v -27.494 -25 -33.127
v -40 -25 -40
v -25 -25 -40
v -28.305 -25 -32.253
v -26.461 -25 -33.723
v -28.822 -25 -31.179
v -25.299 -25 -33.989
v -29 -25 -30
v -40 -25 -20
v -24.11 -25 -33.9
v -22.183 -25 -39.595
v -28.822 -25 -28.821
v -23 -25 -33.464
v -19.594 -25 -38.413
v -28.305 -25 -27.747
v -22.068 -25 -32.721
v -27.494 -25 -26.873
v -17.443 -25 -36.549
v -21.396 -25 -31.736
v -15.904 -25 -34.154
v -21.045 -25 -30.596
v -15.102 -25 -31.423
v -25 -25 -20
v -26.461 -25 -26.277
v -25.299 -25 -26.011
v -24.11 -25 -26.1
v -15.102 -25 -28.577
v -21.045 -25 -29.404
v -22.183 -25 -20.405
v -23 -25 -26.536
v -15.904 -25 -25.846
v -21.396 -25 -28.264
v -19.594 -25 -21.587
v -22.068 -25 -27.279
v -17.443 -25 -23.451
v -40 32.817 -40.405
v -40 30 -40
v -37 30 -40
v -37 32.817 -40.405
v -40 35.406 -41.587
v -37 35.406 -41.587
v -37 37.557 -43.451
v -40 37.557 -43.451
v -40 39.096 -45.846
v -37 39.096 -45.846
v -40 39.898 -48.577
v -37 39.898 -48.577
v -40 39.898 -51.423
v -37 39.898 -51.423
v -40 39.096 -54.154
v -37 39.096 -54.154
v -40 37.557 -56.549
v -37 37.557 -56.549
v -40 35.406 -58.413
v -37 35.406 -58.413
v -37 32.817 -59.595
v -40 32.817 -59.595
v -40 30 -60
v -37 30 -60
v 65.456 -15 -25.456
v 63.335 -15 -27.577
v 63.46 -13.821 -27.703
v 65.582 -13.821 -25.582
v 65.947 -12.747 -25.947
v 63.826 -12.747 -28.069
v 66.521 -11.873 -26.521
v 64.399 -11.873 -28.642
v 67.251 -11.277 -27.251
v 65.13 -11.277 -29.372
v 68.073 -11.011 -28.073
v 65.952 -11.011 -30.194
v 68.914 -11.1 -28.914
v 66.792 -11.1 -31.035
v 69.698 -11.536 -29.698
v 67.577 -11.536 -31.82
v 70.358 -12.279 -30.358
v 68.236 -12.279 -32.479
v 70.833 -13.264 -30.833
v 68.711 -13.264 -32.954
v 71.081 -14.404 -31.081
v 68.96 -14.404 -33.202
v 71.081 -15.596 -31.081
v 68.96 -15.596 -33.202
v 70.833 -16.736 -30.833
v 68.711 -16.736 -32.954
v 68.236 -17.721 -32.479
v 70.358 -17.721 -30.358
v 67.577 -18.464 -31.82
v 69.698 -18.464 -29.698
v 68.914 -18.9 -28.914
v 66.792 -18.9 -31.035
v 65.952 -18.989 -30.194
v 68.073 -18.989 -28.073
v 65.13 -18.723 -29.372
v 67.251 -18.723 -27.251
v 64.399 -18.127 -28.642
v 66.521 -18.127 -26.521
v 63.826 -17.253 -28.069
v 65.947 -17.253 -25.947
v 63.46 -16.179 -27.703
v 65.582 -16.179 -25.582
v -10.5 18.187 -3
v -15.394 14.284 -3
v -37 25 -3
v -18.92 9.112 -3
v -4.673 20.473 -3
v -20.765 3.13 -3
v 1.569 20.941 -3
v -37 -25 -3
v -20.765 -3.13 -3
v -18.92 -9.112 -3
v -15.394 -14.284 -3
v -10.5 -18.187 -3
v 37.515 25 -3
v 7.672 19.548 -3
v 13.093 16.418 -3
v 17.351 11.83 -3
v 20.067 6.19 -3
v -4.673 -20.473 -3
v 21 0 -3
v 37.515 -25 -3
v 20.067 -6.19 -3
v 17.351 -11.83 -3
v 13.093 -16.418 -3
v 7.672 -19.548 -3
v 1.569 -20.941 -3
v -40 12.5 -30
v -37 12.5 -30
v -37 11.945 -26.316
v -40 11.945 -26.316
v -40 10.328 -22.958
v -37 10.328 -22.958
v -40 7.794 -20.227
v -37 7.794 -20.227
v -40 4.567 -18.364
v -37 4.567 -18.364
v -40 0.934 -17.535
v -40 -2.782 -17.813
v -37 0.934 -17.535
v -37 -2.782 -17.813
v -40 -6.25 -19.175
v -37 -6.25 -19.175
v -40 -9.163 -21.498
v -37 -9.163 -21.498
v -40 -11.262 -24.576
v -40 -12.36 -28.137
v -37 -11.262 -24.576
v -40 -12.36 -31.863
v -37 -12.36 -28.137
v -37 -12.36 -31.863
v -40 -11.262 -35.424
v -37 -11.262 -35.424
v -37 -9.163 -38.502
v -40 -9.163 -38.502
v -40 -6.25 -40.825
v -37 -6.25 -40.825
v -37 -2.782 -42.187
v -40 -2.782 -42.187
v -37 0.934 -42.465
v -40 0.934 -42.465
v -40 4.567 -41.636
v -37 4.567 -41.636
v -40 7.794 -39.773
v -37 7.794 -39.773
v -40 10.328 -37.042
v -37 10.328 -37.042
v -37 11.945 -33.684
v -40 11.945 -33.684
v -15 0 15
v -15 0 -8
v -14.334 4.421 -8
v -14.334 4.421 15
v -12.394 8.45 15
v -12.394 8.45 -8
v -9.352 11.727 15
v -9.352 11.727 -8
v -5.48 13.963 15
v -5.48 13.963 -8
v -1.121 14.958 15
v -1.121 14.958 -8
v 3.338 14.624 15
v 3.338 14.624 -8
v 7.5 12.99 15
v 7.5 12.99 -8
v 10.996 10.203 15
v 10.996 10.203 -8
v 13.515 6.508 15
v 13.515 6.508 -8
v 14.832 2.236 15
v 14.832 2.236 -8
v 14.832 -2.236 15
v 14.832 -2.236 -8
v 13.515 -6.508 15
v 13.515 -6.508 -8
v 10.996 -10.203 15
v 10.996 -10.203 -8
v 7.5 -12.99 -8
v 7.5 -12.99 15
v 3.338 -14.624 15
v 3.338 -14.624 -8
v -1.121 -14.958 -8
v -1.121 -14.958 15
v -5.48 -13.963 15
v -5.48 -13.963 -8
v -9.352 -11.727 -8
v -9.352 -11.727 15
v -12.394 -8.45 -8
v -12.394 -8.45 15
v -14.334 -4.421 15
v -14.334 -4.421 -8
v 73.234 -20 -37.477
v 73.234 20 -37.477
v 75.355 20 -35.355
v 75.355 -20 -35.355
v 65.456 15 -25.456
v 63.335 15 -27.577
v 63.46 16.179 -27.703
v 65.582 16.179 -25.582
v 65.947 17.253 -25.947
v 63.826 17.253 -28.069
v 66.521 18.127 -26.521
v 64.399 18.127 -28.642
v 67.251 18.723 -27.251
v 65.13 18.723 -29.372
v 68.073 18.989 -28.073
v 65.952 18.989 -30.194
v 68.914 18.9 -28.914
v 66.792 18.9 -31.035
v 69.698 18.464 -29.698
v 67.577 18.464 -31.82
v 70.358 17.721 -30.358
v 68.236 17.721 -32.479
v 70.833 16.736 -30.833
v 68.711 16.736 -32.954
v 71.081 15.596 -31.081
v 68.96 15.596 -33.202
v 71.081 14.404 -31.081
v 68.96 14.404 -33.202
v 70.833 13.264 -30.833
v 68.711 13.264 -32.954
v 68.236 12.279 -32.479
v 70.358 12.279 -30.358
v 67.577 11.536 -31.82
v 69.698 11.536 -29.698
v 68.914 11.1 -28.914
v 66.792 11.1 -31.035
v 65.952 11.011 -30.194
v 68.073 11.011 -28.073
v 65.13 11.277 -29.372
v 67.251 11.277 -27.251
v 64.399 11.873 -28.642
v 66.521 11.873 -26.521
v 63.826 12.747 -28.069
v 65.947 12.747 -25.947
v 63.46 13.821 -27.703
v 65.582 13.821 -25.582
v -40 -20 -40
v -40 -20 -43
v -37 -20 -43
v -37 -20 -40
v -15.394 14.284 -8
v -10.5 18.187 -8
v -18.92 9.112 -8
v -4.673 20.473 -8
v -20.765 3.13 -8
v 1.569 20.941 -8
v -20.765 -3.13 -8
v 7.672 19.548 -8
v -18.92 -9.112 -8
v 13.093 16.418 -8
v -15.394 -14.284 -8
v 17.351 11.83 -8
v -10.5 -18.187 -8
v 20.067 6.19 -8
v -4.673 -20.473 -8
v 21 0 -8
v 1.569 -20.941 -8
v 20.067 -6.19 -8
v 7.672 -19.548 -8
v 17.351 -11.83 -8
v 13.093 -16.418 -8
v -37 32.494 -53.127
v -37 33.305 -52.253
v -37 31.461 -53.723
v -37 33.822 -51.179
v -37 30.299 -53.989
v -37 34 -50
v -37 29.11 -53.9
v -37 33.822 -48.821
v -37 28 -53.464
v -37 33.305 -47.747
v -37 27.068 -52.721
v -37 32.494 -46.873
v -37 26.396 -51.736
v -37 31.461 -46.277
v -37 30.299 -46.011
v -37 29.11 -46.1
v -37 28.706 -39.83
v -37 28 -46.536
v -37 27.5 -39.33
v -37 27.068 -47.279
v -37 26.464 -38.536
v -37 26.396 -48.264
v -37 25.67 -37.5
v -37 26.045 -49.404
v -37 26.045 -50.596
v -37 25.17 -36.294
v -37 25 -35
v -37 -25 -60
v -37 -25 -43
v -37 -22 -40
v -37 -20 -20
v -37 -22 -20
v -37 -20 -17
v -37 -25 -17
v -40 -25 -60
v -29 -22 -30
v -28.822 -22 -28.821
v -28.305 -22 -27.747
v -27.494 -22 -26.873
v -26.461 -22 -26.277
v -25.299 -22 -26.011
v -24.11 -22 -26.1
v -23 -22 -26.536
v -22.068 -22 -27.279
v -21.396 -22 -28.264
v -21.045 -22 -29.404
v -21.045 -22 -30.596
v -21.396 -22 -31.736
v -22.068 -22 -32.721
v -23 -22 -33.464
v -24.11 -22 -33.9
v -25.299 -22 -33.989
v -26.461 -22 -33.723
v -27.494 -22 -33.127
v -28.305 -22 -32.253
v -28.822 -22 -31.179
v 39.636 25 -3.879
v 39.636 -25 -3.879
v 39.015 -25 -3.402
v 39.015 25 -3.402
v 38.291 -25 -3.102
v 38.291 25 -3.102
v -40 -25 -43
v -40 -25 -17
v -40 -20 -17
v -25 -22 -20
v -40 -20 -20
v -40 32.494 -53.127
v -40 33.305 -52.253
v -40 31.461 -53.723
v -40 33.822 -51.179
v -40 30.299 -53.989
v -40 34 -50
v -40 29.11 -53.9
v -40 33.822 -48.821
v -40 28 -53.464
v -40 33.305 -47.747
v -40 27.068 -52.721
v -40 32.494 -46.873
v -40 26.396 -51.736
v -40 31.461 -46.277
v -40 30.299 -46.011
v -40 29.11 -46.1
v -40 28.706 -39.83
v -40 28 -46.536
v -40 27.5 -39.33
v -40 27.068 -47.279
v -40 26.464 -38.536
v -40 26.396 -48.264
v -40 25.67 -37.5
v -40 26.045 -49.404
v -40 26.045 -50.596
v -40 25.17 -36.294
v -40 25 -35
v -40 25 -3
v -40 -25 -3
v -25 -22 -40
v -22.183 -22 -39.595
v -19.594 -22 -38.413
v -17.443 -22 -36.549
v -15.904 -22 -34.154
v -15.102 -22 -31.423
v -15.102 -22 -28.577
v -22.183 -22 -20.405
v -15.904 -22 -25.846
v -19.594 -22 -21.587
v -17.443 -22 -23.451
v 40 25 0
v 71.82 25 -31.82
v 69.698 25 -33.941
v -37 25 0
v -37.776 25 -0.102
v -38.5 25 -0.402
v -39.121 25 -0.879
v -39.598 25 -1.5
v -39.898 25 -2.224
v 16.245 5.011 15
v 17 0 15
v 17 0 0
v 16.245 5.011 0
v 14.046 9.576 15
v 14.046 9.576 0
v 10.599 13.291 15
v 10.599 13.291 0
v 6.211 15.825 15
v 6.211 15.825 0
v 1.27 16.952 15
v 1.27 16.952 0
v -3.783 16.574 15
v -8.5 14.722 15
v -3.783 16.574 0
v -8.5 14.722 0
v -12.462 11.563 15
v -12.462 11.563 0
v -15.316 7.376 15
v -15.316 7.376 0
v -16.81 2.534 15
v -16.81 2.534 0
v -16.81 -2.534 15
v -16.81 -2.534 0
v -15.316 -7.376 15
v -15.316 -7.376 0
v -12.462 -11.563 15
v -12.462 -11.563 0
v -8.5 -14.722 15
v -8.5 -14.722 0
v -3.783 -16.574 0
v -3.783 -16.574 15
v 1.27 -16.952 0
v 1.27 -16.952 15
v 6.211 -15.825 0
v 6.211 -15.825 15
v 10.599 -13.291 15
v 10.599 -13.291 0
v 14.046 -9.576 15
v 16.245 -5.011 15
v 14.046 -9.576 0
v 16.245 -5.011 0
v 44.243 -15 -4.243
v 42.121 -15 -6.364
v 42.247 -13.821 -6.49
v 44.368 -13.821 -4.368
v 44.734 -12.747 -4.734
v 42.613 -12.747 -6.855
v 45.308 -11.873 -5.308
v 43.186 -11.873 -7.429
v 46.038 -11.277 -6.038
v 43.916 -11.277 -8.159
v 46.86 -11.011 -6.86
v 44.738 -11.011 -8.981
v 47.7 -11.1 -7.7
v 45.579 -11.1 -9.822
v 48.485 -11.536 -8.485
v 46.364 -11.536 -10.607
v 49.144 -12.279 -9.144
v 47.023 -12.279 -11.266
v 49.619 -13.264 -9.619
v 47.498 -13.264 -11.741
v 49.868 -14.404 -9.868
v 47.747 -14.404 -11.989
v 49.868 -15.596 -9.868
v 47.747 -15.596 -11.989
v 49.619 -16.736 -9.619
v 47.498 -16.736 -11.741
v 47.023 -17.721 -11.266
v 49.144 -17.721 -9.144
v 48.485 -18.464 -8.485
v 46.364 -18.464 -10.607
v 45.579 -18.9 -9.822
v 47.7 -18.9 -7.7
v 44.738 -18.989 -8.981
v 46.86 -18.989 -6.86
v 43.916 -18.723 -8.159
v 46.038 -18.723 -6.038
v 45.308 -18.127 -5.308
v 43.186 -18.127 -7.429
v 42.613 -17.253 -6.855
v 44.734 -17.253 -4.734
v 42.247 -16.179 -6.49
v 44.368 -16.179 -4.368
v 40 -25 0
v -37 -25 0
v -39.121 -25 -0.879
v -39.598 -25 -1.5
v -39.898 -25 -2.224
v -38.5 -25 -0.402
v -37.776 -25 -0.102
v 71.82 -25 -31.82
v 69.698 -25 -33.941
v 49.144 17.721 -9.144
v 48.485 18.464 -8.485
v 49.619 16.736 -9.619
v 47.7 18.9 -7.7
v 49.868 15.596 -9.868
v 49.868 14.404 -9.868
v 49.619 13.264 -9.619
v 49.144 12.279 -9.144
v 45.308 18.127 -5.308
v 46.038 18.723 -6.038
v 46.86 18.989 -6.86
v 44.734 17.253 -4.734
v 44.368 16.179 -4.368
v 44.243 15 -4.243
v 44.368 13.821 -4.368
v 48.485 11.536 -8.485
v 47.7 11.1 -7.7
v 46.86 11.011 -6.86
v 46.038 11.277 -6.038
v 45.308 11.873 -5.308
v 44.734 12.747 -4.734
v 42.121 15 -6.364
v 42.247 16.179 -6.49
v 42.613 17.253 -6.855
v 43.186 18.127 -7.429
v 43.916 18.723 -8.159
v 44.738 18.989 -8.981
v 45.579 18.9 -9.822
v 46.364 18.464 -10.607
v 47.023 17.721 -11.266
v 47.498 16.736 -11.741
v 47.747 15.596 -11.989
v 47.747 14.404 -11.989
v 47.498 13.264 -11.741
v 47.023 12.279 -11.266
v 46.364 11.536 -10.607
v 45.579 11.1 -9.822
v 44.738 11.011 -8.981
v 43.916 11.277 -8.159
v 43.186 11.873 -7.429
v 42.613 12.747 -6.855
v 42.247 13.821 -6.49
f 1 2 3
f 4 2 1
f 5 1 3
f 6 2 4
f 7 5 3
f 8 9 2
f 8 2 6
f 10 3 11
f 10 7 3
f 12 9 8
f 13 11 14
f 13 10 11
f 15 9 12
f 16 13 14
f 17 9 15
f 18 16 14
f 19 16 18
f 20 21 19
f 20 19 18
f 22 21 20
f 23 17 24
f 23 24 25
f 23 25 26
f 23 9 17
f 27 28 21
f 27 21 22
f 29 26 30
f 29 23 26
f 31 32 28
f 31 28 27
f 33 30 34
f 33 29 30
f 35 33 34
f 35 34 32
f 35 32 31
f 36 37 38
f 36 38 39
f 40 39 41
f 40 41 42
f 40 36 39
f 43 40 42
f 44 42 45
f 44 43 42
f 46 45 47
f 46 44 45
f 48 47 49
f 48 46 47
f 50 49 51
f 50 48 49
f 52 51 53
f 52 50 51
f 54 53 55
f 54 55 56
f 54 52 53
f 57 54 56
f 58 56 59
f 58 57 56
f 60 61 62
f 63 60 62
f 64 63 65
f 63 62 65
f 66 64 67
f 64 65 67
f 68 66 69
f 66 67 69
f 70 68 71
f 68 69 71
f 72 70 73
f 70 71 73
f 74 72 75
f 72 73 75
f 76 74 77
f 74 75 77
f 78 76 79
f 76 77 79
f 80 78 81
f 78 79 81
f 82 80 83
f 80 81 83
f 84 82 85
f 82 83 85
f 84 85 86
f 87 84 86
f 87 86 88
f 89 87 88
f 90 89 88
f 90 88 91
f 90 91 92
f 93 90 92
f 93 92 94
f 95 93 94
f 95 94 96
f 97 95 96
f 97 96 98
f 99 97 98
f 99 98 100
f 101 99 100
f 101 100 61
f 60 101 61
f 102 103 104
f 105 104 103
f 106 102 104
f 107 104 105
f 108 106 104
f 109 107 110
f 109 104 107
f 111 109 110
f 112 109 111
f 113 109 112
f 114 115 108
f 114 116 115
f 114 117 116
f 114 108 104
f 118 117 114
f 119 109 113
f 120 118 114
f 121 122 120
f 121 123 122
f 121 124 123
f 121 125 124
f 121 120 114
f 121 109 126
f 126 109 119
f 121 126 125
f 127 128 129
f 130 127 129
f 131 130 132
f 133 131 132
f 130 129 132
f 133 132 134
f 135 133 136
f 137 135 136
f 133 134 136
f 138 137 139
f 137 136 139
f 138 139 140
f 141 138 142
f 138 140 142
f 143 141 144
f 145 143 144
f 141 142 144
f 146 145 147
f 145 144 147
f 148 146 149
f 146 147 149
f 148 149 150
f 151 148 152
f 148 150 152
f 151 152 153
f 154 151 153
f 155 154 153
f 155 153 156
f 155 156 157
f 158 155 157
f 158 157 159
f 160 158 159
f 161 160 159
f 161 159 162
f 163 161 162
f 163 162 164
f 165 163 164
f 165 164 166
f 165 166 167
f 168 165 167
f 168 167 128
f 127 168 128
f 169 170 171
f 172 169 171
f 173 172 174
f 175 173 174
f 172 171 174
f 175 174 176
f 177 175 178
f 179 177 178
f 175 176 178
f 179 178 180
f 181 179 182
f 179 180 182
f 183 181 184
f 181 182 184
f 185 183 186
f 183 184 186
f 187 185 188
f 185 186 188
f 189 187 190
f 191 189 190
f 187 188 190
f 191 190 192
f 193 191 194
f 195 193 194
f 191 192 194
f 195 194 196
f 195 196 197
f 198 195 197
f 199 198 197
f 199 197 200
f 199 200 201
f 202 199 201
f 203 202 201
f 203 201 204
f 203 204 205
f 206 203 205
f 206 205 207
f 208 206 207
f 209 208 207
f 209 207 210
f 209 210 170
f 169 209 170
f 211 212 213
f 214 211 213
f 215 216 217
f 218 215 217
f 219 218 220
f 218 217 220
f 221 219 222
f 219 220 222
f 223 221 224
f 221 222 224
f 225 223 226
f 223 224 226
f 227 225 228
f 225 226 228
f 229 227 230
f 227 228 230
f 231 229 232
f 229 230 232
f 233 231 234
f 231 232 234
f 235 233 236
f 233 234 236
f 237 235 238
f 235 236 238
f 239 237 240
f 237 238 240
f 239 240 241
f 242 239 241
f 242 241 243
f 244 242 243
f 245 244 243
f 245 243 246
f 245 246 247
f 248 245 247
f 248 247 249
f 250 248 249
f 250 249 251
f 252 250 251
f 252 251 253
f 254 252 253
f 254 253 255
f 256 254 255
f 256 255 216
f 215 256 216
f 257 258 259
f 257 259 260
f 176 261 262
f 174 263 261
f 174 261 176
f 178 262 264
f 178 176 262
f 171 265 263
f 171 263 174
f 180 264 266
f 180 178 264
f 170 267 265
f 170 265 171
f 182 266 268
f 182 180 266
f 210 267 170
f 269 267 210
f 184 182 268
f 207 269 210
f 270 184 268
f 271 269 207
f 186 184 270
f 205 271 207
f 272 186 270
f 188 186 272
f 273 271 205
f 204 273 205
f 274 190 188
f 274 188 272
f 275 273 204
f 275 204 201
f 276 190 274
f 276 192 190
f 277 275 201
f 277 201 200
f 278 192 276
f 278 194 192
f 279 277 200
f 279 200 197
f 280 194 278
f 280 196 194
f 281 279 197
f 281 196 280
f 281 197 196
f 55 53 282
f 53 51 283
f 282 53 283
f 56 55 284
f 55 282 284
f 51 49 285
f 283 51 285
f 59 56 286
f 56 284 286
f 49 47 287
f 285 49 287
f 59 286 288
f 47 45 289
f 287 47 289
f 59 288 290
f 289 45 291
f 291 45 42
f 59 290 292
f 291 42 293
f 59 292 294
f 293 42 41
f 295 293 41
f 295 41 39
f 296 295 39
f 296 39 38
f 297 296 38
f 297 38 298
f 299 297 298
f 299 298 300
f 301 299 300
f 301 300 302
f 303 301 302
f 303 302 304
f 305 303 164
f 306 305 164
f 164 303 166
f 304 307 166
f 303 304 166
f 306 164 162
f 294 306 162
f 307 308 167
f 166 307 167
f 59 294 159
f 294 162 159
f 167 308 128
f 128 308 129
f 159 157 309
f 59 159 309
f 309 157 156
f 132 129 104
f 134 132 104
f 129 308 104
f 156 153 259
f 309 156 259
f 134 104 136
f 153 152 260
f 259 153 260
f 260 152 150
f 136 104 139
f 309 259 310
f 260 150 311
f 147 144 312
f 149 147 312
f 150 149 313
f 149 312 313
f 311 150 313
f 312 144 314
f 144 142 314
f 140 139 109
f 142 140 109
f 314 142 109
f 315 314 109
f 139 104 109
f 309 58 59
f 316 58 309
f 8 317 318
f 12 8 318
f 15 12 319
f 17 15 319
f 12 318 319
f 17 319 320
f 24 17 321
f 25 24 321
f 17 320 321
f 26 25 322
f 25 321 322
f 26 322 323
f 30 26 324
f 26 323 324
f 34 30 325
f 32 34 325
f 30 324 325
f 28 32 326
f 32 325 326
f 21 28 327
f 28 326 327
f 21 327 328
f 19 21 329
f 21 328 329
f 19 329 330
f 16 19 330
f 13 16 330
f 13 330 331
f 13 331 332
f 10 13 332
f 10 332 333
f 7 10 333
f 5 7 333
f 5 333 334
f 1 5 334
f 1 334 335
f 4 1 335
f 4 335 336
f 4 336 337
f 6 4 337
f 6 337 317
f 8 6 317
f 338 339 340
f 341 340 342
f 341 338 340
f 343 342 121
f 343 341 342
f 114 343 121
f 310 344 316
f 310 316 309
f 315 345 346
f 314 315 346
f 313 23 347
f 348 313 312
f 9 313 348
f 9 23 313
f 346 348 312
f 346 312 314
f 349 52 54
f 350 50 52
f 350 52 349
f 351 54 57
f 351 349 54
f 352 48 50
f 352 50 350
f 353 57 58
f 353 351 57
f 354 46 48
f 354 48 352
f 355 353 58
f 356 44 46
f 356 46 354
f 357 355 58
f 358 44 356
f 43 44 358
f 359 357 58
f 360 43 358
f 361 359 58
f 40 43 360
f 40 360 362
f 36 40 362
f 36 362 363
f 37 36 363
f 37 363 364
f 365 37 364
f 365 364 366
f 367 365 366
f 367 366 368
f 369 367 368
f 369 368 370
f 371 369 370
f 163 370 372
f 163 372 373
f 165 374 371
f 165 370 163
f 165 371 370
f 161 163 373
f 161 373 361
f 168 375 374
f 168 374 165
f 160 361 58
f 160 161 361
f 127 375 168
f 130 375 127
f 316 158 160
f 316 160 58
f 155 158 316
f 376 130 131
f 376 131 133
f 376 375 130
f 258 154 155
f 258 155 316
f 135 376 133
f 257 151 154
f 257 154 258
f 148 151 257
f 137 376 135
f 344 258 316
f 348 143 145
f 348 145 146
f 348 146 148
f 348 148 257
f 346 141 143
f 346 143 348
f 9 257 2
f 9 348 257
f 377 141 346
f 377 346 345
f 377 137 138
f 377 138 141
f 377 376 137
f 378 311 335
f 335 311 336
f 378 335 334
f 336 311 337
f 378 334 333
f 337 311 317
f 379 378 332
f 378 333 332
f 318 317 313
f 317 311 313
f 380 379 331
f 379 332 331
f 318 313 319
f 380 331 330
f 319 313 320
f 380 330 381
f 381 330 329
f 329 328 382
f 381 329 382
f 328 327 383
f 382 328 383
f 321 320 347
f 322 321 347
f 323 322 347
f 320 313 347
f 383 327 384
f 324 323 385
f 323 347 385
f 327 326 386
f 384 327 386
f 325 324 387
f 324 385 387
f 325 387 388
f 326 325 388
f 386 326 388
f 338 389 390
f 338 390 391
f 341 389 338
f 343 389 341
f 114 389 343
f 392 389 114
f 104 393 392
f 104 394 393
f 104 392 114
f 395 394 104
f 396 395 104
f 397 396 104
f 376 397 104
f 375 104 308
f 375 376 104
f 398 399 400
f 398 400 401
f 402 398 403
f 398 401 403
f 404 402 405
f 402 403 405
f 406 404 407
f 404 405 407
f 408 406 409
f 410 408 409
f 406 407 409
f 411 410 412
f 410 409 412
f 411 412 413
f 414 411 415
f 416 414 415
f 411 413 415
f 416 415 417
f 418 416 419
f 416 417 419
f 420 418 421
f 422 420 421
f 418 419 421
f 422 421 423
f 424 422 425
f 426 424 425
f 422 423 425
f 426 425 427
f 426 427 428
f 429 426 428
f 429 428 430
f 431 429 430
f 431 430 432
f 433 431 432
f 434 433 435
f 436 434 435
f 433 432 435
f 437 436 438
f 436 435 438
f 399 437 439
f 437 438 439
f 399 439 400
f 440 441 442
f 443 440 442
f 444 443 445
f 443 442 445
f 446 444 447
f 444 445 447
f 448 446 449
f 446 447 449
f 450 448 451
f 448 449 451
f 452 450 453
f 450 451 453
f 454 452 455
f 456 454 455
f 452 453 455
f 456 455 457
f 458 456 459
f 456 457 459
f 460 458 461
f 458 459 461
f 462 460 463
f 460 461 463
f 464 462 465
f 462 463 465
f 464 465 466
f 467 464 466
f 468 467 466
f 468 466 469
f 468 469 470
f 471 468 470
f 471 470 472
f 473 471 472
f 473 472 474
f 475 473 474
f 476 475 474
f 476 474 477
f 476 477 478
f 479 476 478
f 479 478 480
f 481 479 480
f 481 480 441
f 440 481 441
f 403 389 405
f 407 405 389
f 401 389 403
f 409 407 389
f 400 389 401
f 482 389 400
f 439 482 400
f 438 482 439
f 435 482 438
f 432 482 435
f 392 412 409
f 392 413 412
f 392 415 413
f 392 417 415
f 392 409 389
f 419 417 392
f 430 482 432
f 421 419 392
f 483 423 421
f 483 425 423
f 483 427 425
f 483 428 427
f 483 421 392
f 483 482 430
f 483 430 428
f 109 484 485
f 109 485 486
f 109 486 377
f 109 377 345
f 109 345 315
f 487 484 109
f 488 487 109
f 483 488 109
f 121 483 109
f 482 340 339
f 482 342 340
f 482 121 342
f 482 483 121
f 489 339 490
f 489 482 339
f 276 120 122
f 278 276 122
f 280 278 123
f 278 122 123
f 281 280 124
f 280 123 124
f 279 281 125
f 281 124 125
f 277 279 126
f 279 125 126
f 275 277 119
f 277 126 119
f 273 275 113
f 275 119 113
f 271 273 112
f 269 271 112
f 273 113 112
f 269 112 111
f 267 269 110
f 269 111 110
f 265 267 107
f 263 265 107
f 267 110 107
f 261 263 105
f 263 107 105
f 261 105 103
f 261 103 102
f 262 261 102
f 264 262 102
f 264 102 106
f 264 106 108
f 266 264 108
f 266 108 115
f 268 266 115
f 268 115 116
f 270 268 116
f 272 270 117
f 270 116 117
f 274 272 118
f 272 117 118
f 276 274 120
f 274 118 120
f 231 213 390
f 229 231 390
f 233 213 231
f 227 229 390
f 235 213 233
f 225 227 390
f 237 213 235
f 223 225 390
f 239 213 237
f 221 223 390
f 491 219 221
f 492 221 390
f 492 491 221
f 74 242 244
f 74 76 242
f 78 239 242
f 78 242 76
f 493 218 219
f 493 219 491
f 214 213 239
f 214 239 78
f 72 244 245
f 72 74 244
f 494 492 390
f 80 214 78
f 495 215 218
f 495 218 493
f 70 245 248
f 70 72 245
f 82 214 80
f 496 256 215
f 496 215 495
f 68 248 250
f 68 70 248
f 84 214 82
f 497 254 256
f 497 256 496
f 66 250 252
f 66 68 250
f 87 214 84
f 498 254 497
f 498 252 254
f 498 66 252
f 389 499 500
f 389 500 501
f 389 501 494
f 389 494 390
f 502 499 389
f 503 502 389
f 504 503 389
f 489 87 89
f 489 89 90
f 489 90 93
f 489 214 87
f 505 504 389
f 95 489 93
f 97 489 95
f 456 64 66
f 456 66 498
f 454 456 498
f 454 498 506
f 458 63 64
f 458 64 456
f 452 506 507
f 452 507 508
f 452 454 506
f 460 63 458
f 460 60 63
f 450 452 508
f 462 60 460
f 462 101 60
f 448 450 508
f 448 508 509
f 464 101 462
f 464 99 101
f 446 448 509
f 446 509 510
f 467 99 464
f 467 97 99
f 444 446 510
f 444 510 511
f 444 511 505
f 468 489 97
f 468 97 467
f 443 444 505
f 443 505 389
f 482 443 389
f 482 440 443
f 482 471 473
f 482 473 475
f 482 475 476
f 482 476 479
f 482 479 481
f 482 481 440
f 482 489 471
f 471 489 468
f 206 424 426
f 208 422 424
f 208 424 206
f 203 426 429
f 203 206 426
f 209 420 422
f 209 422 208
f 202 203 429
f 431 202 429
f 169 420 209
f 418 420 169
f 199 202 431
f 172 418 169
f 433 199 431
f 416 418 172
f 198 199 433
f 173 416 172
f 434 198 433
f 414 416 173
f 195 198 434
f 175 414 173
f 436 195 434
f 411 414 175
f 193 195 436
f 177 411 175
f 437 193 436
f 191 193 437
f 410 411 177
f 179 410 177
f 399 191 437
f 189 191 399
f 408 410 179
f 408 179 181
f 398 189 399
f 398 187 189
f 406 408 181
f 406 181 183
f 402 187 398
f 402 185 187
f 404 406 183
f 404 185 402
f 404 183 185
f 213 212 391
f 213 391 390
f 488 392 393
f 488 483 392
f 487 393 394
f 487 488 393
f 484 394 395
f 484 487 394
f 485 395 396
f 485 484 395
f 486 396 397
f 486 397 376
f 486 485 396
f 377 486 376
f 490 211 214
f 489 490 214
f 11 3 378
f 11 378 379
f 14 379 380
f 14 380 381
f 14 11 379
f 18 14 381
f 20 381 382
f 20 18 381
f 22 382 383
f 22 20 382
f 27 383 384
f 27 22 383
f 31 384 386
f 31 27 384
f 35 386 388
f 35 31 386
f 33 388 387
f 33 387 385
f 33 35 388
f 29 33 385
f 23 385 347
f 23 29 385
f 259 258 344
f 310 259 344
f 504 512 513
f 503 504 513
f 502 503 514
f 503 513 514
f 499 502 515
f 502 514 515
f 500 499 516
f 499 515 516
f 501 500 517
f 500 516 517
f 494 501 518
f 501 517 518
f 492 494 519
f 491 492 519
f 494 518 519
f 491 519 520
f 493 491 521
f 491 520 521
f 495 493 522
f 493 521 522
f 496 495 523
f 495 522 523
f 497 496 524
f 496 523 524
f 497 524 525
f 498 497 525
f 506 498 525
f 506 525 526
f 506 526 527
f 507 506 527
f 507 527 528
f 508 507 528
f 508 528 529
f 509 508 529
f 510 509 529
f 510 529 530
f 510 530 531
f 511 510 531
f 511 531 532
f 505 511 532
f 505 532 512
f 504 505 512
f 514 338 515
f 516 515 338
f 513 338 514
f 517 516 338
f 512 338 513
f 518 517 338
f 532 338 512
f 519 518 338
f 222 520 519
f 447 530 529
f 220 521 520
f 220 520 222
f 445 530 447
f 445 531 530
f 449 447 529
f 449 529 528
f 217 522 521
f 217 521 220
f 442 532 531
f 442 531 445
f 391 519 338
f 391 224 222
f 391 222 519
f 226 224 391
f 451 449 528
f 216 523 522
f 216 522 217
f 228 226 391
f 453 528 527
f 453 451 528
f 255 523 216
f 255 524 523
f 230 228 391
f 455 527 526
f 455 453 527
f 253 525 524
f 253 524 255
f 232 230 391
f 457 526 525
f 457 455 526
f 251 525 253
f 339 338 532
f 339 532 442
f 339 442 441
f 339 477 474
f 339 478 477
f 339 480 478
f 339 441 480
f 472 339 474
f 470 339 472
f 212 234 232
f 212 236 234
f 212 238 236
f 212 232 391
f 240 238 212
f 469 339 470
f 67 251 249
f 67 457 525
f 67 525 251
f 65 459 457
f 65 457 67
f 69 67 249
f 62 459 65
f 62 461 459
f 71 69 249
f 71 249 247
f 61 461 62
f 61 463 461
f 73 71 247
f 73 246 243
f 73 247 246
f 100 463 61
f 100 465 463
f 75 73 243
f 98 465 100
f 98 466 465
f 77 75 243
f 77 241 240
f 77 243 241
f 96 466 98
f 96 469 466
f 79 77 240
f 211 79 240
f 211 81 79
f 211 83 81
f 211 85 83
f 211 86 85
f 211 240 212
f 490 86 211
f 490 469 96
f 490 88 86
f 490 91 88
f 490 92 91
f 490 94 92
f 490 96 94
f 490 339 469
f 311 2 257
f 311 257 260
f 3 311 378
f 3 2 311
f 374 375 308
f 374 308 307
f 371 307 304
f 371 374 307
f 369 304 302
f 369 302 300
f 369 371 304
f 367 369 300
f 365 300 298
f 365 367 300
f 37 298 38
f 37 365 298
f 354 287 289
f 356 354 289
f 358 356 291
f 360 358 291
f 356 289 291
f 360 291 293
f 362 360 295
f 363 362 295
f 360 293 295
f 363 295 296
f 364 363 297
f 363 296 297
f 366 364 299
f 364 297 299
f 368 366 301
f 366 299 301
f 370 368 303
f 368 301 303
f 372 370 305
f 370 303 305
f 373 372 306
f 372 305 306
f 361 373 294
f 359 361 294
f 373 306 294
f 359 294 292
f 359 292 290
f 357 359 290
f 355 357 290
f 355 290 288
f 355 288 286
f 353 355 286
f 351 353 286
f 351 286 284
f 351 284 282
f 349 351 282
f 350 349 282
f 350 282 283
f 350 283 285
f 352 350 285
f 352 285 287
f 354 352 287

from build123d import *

# Parameters (mm, degrees)
F1_DEPTH      = 25
F1_DEPTH_BACK = 25
F2_R          = 17
F3_DEPTH      = 15
F4_R          = 21
F5_DEPTH      = 5
F7_D          = 30
F8_W          = 5
F8_H          = 3
F9_DEPTH      = 5
F10_DEPTH     = 3
F11_D         = 25
F11_DEPTH     = 5
F11_TIP       = 7.5107577378
F12_D         = 8
F13_W         = 3
F13_H         = 20
F14_DEPTH     = 3
F16_D         = 8
F16_DEPTH     = 5
F16_TIP       = 2.4034424761
F18_D         = 8
F18_DEPTH     = 5
F18_TIP       = 2.4034424761
F19_SIZE      = 5
F20_R         = 3


with BuildPart() as f1:
    # F0 (on Front) → F1 (new body, two sides)
    with BuildSketch(Plane.XZ) as f1_sk:
        Polygon((75.3553390593, -35.3553390593), (40, 0), (-40, 0), (-40, -60), (-37, -60), (-37, -3), (38.7573593129, -3), (73.2340187158, -37.4766594029), align=None)
    extrude(amount=F1_DEPTH)
    extrude(f1_sk.sketch, amount=-F1_DEPTH_BACK)

    # F2 (on face) → F3 (join)
    with BuildSketch(Plane.XY):
        Circle(F2_R)
    extrude(amount=F3_DEPTH)

    # F4 (on face) → F5 (join)
    with BuildSketch(Plane(origin=(0, 0, -3), x_dir=(1, 0, 0), z_dir=(0, 0, -1))):
        Circle(F4_R)
    extrude(amount=F5_DEPTH)

    # F7 (through all)
    with Locations(Plane.XY.offset(15)):
        with Locations((0, 0)):
            Hole(F7_D / 2)

    # F8 (on face) → F9 (cut)
    with BuildSketch(Plane(origin=(-40, 0, 0), x_dir=(0, -1, 0), z_dir=(-1, 0, 0))):
        with Locations((27.5, -18.5)):
            Rectangle(F8_W, F8_H)
        with Locations((27.5, -41.5)):
            Rectangle(F8_W, F8_H)
        with Locations((22.5, -18.5)):
            Rectangle(F8_W, F8_H)
        with Locations((22.5, -41.5)):
            Rectangle(F8_W, F8_H)
    extrude(amount=-F9_DEPTH, mode=Mode.SUBTRACT)

    # F8 (on face) → F10 (join)
    with BuildSketch(Plane(origin=(-40, 0, 0), x_dir=(0, -1, 0), z_dir=(-1, 0, 0))):
        with BuildLine():
            Line((-25, -60), (-25, -35))
            ThreePointArc((-25, -35), (-26.4644660941, -38.5355339059), (-30, -40))
            ThreePointArc((-30, -40), (-40, -50), (-30, -60))
            Line((-30, -60), (-25, -60))
        make_face()
        Polygon((0, -30), (-25, -30), (-25, -35), (-25, -60), (0, -60), align=None)
    extrude(amount=-F10_DEPTH)

    # F11
    with Locations(Plane(origin=(-40, 0, 0), x_dir=(0, -1, 0), z_dir=(-1, 0, 0))):
        with Locations((0, -30)):
            Hole(F11_D / 2, depth=F11_DEPTH)
            with Locations((0, 0, -(F11_DEPTH + F11_TIP / 2))):  # 118° drill point
                Cone(0, F11_D / 2, F11_TIP, mode=Mode.SUBTRACT)

    # F12 (through all)
    with Locations(Plane(origin=(-40, 0, 0), x_dir=(0, -1, 0), z_dir=(-1, 0, 0))):
        with Locations((-30, -50)):
            Hole(F12_D / 2)

    # F13 (on face) → F14 (join)
    with BuildSketch(Plane.XZ.offset(25)):
        with BuildLine():
            Line((-25, -20), (-37, -20))
            Line((-37, -20), (-37, -40))
            Line((-37, -40), (-25, -40))
            ThreePointArc((-25, -40), (-15, -30), (-25, -20))
        make_face()
        with Locations((-38.5, -30)):
            Rectangle(F13_W, F13_H)
    extrude(amount=-F14_DEPTH)

    # F16
    with Locations(Plane.XZ.offset(25)):
        with Locations((-25, -30)):
            Hole(F16_D / 2, depth=F16_DEPTH)
            with Locations((0, 0, -(F16_DEPTH + F16_TIP / 2))):  # 118° drill point
                Cone(0, F16_D / 2, F16_TIP, mode=Mode.SUBTRACT)

    # F18
    with Locations(Plane(origin=(20, 0, 20), x_dir=(0.7071067812, 0, -0.7071067812), z_dir=(0.7071067812, 0, 0.7071067812))):
        with Locations((38.2842712475, -15), (38.2842712475, 15), (68.2842712475, -15), (68.2842712475, 15)):
            Hole(F18_D / 2, depth=F18_DEPTH)
            with Locations((0, 0, -(F18_DEPTH + F18_TIP / 2))):  # 118° drill point
                Cone(0, F18_D / 2, F18_TIP, mode=Mode.SUBTRACT)

    # F19
    f19_edges = [f1.edges().sort_by_distance(p)[0] for p in [
        (74.294679, 25, -36.415999),
        (74.294679, -25, -36.415999),
    ]]
    chamfer(f19_edges, length=F19_SIZE)

    # F20
    f20_edges = [f1.edges().sort_by_distance(p)[0] for p in [
        (-40, 0, 0),
        (38.757359, 0, -3),
    ]]
    fillet(f20_edges, radius=F20_R)


solid = f1.part
